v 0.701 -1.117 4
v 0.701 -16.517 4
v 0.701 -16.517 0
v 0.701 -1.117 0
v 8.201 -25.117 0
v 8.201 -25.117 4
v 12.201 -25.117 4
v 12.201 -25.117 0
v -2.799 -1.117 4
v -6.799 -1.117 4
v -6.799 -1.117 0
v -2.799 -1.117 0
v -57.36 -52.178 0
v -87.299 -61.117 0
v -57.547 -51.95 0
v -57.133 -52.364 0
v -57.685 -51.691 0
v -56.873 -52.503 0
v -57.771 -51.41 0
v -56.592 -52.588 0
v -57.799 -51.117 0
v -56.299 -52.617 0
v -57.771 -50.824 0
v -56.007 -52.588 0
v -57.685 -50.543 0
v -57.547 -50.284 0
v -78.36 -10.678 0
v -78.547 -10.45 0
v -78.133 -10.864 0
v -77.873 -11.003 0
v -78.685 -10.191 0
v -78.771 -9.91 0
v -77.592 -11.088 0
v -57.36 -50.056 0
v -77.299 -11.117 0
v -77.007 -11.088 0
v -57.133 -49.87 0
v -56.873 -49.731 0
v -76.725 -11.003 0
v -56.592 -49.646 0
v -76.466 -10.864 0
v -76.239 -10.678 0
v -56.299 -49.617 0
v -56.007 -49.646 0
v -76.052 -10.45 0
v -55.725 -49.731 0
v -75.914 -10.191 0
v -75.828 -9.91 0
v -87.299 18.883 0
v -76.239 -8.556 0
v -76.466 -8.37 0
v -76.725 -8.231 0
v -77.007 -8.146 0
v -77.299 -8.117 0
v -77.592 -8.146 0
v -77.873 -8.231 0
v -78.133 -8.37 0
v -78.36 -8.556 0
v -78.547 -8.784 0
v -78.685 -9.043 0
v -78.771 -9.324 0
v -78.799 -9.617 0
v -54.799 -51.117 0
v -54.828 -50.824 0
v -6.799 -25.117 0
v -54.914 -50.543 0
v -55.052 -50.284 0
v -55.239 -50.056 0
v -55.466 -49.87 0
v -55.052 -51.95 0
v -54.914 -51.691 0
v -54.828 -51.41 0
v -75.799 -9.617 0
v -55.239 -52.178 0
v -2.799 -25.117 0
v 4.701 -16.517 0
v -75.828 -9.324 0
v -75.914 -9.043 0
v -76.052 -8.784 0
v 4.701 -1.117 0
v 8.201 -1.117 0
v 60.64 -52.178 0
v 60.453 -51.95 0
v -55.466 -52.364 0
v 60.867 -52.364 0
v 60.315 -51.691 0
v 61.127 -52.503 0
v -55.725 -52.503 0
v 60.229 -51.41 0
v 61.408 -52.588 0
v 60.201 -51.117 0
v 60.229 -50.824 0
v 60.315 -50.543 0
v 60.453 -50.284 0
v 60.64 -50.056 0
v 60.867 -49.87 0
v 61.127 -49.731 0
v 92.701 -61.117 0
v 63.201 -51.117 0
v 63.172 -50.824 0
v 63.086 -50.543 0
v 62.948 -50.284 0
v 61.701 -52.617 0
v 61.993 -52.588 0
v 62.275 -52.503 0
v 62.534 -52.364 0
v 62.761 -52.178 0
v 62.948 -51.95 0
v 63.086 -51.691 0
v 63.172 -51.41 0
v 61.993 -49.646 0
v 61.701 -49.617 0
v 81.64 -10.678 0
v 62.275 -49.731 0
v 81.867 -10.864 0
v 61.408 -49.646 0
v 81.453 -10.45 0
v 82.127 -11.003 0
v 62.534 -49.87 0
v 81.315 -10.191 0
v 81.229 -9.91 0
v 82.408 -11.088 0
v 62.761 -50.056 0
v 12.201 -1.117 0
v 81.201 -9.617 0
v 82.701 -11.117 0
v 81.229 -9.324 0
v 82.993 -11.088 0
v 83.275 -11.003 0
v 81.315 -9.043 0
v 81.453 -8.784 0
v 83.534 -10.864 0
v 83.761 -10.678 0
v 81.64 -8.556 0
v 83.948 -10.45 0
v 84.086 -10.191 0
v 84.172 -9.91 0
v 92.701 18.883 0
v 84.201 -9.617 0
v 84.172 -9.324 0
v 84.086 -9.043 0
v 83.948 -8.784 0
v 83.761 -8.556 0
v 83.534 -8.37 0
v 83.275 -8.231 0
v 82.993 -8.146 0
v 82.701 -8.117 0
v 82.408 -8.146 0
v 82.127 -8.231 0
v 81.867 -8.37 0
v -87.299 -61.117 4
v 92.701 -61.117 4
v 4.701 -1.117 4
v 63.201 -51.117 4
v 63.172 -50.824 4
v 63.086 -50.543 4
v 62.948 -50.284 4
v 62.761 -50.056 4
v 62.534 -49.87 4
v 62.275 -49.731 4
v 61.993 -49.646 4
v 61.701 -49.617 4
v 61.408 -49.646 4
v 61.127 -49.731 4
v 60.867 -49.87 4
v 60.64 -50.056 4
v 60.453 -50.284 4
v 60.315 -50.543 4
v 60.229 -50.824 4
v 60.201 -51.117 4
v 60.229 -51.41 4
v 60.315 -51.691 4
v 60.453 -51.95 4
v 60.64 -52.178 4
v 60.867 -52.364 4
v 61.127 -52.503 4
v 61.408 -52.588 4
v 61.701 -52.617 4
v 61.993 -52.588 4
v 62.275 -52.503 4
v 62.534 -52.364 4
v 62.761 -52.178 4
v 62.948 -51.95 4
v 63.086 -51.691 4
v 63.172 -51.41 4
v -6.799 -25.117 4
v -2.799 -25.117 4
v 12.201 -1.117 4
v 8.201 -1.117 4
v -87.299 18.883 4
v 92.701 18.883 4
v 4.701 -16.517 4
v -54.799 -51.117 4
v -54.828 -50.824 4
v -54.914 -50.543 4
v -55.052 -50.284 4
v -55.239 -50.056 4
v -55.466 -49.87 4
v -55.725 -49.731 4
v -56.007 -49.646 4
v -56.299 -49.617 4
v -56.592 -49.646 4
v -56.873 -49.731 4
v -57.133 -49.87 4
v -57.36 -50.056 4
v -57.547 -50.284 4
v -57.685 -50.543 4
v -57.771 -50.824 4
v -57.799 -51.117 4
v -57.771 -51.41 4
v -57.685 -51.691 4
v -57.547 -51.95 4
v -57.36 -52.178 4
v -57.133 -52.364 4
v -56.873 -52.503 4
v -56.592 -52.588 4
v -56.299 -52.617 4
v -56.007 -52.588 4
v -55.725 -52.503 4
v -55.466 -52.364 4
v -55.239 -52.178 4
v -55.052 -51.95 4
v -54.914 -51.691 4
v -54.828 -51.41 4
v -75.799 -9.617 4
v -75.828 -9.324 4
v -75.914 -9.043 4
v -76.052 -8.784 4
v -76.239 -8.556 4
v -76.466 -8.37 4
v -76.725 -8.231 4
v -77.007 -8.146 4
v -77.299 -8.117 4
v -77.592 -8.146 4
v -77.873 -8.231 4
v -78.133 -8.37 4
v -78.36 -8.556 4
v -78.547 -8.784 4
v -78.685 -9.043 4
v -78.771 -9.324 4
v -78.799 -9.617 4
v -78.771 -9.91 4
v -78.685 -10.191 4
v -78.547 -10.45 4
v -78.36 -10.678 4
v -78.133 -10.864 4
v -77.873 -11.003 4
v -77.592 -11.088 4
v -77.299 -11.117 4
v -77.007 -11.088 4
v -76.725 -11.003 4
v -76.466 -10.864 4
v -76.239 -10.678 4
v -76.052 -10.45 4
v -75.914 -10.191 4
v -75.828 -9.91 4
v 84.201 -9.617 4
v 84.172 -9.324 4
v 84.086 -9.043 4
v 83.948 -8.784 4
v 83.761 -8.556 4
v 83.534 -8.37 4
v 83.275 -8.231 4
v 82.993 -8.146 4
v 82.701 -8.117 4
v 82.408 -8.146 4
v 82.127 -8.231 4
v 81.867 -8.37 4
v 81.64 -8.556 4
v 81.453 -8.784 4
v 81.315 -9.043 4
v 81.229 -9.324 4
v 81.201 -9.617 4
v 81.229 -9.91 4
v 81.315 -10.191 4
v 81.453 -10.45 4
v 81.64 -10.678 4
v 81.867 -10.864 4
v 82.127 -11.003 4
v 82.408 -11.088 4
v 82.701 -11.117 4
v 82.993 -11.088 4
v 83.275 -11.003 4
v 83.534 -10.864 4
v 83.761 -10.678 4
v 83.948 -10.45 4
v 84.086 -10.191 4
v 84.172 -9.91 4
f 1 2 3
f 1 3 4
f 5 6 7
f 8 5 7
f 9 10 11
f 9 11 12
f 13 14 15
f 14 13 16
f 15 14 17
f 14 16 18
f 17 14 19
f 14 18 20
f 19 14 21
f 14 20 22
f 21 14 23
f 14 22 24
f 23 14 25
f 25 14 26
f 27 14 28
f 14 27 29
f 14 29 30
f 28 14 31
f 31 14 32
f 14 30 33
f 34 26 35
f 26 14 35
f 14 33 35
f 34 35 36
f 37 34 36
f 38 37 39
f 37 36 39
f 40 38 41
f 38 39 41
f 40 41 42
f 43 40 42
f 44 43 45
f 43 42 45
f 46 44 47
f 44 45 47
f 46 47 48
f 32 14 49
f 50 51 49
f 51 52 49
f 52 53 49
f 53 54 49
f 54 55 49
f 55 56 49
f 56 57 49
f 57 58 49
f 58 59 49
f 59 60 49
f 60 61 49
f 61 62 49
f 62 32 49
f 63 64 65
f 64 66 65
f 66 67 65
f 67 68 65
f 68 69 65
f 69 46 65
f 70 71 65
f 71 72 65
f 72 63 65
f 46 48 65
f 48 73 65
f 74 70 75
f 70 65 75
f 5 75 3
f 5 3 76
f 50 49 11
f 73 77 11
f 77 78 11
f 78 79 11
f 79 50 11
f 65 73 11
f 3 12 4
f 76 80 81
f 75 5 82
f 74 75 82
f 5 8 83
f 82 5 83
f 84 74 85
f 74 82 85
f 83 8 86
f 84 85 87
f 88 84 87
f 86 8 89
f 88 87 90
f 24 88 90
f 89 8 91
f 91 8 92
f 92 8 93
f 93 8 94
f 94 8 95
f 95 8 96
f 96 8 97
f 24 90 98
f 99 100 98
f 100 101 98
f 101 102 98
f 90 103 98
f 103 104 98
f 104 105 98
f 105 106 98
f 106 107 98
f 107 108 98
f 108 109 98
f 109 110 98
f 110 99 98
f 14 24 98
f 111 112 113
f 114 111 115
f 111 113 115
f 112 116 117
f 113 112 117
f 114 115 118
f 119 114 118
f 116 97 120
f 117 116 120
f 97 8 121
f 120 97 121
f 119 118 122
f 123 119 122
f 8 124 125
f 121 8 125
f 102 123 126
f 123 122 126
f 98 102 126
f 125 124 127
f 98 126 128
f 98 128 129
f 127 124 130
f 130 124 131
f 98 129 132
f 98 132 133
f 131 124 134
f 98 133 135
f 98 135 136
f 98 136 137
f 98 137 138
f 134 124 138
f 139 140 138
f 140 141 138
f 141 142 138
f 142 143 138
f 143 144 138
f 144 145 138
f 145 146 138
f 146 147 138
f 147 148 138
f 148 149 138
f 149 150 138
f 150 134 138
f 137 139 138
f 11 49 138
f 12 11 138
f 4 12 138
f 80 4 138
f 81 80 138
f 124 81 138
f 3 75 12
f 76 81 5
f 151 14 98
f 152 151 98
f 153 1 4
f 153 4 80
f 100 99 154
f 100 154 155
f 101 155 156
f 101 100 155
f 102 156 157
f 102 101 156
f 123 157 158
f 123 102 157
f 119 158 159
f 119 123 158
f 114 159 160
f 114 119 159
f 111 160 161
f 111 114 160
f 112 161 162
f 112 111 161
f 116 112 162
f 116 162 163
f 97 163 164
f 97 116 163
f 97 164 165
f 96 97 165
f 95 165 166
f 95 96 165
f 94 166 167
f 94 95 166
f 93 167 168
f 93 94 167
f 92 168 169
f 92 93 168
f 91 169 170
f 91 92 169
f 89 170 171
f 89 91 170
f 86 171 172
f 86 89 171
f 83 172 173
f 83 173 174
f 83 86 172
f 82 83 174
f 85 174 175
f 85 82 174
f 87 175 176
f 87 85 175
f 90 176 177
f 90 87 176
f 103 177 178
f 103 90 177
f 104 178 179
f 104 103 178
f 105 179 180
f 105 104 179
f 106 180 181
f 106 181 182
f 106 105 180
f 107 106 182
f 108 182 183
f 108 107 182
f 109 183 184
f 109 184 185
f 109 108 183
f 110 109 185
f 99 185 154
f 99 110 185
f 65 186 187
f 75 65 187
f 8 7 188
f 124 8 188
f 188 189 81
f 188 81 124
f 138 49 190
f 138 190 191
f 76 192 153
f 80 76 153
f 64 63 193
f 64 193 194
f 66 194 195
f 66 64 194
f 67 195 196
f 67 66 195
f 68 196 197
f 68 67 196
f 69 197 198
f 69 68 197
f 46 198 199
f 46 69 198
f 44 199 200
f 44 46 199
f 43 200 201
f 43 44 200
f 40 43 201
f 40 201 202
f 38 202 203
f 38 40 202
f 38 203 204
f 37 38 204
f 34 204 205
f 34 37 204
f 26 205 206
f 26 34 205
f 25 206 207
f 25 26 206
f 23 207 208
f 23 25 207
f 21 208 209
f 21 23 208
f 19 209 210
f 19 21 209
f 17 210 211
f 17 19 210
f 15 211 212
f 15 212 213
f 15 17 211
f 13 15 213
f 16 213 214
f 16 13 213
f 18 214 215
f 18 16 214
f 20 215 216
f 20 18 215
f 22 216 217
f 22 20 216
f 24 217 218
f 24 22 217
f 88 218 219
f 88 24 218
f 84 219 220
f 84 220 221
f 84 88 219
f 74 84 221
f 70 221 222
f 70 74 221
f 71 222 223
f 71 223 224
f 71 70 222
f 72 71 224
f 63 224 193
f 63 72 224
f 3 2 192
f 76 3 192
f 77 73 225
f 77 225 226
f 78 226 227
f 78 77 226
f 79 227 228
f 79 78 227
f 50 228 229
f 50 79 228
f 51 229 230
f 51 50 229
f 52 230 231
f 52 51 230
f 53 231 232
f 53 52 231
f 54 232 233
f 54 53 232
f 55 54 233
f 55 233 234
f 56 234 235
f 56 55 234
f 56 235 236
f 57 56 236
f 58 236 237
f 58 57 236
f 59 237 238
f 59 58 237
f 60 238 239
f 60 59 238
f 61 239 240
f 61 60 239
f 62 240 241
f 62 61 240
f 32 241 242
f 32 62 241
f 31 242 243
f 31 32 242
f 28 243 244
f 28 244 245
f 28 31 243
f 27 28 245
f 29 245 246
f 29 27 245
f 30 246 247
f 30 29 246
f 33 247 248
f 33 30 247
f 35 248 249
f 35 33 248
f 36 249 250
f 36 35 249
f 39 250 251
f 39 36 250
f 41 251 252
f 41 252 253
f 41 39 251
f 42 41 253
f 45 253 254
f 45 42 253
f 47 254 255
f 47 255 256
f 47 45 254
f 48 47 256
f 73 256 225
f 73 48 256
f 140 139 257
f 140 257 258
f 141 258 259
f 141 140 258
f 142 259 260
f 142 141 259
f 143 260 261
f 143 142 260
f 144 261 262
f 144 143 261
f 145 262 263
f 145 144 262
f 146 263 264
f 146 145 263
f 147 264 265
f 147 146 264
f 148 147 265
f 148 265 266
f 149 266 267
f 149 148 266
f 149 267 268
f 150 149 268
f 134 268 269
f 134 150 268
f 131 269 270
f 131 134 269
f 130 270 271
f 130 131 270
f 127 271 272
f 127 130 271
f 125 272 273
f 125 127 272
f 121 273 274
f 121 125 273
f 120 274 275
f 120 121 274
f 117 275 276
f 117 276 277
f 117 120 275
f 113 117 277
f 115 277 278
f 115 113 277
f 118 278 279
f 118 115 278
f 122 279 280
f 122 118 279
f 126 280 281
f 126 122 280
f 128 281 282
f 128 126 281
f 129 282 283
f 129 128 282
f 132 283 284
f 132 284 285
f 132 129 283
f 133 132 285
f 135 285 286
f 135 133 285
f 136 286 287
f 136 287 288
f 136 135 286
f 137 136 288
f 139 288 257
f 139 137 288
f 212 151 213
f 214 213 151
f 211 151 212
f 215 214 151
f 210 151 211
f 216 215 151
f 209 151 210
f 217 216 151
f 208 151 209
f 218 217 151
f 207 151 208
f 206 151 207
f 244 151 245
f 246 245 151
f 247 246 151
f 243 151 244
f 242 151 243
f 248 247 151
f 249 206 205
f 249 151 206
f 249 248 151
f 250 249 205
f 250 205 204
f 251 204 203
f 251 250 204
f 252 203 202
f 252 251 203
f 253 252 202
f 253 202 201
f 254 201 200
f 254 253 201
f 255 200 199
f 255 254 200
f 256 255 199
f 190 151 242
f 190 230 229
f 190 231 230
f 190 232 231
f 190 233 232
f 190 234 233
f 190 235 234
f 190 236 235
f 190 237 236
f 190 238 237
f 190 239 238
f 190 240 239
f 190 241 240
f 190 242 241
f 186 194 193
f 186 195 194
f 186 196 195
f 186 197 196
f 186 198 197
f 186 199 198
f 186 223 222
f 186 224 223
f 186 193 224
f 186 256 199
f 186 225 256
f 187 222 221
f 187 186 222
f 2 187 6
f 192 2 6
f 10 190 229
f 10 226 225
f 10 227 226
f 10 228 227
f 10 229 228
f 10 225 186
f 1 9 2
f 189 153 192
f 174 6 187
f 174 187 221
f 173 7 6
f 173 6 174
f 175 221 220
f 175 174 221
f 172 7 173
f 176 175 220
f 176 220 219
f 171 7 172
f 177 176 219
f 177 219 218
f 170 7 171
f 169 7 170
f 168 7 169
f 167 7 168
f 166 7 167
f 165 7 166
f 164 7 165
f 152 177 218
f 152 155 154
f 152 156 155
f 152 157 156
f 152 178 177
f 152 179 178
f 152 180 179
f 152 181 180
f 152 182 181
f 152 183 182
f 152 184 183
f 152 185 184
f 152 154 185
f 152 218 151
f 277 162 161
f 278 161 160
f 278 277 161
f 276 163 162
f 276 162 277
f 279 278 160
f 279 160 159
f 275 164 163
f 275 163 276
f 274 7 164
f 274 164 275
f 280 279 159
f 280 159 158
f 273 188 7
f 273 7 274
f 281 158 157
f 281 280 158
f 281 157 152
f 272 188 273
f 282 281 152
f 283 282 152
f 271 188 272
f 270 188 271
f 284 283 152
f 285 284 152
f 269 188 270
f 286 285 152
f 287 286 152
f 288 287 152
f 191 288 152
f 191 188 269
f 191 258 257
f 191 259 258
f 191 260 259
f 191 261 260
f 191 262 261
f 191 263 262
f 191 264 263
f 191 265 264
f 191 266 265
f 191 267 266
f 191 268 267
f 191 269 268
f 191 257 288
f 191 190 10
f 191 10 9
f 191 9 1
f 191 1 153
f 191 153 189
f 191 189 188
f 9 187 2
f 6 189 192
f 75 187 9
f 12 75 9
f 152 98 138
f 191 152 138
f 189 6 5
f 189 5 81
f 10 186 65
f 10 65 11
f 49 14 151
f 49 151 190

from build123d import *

# Parameters (mm, degrees)
SKETCH1_W           = 180
SKETCH1_H           = 80
SKETCH1_R           = 1.5
BOSS_EXTRUDE1_DEPTH = 4
SKETCH2_W           = 4
SKETCH2_H           = 24
SKETCH2_H_2         = 15.4
CUT_EXTRUDE1_DEPTH  = 4


with BuildPart() as part:
    # Sketch1 → Boss-Extrude1 (new body)
    with BuildSketch(Plane.XY):
        with Locations((2.700642055, -21.117125984)):
            Rectangle(SKETCH1_W, SKETCH1_H)
        with Locations((-77.299357945, -9.617125984)):
            Circle(SKETCH1_R, mode=Mode.SUBTRACT)
        with Locations((82.700642055, -9.617125984)):
            Circle(SKETCH1_R, mode=Mode.SUBTRACT)
        with Locations((61.700642055, -51.117125984)):
            Circle(SKETCH1_R, mode=Mode.SUBTRACT)
        with Locations((-56.299357945, -51.117125984)):
            Circle(SKETCH1_R, mode=Mode.SUBTRACT)
    extrude(amount=BOSS_EXTRUDE1_DEPTH)

    # Sketch2 → Cut-Extrude1 (cut)
    with BuildSketch(Plane.XY.offset(4)):
        with Locations((-4.799357945, -13.117125984)):
            Rectangle(SKETCH2_W, SKETCH2_H)
        with Locations((2.700642055, -8.817125984)):
            Rectangle(SKETCH2_W, SKETCH2_H_2)
        with Locations((10.200642055, -13.117125984)):
            Rectangle(SKETCH2_W, SKETCH2_H)
    extrude(amount=-CUT_EXTRUDE1_DEPTH, mode=Mode.SUBTRACT)


solid = part.part
